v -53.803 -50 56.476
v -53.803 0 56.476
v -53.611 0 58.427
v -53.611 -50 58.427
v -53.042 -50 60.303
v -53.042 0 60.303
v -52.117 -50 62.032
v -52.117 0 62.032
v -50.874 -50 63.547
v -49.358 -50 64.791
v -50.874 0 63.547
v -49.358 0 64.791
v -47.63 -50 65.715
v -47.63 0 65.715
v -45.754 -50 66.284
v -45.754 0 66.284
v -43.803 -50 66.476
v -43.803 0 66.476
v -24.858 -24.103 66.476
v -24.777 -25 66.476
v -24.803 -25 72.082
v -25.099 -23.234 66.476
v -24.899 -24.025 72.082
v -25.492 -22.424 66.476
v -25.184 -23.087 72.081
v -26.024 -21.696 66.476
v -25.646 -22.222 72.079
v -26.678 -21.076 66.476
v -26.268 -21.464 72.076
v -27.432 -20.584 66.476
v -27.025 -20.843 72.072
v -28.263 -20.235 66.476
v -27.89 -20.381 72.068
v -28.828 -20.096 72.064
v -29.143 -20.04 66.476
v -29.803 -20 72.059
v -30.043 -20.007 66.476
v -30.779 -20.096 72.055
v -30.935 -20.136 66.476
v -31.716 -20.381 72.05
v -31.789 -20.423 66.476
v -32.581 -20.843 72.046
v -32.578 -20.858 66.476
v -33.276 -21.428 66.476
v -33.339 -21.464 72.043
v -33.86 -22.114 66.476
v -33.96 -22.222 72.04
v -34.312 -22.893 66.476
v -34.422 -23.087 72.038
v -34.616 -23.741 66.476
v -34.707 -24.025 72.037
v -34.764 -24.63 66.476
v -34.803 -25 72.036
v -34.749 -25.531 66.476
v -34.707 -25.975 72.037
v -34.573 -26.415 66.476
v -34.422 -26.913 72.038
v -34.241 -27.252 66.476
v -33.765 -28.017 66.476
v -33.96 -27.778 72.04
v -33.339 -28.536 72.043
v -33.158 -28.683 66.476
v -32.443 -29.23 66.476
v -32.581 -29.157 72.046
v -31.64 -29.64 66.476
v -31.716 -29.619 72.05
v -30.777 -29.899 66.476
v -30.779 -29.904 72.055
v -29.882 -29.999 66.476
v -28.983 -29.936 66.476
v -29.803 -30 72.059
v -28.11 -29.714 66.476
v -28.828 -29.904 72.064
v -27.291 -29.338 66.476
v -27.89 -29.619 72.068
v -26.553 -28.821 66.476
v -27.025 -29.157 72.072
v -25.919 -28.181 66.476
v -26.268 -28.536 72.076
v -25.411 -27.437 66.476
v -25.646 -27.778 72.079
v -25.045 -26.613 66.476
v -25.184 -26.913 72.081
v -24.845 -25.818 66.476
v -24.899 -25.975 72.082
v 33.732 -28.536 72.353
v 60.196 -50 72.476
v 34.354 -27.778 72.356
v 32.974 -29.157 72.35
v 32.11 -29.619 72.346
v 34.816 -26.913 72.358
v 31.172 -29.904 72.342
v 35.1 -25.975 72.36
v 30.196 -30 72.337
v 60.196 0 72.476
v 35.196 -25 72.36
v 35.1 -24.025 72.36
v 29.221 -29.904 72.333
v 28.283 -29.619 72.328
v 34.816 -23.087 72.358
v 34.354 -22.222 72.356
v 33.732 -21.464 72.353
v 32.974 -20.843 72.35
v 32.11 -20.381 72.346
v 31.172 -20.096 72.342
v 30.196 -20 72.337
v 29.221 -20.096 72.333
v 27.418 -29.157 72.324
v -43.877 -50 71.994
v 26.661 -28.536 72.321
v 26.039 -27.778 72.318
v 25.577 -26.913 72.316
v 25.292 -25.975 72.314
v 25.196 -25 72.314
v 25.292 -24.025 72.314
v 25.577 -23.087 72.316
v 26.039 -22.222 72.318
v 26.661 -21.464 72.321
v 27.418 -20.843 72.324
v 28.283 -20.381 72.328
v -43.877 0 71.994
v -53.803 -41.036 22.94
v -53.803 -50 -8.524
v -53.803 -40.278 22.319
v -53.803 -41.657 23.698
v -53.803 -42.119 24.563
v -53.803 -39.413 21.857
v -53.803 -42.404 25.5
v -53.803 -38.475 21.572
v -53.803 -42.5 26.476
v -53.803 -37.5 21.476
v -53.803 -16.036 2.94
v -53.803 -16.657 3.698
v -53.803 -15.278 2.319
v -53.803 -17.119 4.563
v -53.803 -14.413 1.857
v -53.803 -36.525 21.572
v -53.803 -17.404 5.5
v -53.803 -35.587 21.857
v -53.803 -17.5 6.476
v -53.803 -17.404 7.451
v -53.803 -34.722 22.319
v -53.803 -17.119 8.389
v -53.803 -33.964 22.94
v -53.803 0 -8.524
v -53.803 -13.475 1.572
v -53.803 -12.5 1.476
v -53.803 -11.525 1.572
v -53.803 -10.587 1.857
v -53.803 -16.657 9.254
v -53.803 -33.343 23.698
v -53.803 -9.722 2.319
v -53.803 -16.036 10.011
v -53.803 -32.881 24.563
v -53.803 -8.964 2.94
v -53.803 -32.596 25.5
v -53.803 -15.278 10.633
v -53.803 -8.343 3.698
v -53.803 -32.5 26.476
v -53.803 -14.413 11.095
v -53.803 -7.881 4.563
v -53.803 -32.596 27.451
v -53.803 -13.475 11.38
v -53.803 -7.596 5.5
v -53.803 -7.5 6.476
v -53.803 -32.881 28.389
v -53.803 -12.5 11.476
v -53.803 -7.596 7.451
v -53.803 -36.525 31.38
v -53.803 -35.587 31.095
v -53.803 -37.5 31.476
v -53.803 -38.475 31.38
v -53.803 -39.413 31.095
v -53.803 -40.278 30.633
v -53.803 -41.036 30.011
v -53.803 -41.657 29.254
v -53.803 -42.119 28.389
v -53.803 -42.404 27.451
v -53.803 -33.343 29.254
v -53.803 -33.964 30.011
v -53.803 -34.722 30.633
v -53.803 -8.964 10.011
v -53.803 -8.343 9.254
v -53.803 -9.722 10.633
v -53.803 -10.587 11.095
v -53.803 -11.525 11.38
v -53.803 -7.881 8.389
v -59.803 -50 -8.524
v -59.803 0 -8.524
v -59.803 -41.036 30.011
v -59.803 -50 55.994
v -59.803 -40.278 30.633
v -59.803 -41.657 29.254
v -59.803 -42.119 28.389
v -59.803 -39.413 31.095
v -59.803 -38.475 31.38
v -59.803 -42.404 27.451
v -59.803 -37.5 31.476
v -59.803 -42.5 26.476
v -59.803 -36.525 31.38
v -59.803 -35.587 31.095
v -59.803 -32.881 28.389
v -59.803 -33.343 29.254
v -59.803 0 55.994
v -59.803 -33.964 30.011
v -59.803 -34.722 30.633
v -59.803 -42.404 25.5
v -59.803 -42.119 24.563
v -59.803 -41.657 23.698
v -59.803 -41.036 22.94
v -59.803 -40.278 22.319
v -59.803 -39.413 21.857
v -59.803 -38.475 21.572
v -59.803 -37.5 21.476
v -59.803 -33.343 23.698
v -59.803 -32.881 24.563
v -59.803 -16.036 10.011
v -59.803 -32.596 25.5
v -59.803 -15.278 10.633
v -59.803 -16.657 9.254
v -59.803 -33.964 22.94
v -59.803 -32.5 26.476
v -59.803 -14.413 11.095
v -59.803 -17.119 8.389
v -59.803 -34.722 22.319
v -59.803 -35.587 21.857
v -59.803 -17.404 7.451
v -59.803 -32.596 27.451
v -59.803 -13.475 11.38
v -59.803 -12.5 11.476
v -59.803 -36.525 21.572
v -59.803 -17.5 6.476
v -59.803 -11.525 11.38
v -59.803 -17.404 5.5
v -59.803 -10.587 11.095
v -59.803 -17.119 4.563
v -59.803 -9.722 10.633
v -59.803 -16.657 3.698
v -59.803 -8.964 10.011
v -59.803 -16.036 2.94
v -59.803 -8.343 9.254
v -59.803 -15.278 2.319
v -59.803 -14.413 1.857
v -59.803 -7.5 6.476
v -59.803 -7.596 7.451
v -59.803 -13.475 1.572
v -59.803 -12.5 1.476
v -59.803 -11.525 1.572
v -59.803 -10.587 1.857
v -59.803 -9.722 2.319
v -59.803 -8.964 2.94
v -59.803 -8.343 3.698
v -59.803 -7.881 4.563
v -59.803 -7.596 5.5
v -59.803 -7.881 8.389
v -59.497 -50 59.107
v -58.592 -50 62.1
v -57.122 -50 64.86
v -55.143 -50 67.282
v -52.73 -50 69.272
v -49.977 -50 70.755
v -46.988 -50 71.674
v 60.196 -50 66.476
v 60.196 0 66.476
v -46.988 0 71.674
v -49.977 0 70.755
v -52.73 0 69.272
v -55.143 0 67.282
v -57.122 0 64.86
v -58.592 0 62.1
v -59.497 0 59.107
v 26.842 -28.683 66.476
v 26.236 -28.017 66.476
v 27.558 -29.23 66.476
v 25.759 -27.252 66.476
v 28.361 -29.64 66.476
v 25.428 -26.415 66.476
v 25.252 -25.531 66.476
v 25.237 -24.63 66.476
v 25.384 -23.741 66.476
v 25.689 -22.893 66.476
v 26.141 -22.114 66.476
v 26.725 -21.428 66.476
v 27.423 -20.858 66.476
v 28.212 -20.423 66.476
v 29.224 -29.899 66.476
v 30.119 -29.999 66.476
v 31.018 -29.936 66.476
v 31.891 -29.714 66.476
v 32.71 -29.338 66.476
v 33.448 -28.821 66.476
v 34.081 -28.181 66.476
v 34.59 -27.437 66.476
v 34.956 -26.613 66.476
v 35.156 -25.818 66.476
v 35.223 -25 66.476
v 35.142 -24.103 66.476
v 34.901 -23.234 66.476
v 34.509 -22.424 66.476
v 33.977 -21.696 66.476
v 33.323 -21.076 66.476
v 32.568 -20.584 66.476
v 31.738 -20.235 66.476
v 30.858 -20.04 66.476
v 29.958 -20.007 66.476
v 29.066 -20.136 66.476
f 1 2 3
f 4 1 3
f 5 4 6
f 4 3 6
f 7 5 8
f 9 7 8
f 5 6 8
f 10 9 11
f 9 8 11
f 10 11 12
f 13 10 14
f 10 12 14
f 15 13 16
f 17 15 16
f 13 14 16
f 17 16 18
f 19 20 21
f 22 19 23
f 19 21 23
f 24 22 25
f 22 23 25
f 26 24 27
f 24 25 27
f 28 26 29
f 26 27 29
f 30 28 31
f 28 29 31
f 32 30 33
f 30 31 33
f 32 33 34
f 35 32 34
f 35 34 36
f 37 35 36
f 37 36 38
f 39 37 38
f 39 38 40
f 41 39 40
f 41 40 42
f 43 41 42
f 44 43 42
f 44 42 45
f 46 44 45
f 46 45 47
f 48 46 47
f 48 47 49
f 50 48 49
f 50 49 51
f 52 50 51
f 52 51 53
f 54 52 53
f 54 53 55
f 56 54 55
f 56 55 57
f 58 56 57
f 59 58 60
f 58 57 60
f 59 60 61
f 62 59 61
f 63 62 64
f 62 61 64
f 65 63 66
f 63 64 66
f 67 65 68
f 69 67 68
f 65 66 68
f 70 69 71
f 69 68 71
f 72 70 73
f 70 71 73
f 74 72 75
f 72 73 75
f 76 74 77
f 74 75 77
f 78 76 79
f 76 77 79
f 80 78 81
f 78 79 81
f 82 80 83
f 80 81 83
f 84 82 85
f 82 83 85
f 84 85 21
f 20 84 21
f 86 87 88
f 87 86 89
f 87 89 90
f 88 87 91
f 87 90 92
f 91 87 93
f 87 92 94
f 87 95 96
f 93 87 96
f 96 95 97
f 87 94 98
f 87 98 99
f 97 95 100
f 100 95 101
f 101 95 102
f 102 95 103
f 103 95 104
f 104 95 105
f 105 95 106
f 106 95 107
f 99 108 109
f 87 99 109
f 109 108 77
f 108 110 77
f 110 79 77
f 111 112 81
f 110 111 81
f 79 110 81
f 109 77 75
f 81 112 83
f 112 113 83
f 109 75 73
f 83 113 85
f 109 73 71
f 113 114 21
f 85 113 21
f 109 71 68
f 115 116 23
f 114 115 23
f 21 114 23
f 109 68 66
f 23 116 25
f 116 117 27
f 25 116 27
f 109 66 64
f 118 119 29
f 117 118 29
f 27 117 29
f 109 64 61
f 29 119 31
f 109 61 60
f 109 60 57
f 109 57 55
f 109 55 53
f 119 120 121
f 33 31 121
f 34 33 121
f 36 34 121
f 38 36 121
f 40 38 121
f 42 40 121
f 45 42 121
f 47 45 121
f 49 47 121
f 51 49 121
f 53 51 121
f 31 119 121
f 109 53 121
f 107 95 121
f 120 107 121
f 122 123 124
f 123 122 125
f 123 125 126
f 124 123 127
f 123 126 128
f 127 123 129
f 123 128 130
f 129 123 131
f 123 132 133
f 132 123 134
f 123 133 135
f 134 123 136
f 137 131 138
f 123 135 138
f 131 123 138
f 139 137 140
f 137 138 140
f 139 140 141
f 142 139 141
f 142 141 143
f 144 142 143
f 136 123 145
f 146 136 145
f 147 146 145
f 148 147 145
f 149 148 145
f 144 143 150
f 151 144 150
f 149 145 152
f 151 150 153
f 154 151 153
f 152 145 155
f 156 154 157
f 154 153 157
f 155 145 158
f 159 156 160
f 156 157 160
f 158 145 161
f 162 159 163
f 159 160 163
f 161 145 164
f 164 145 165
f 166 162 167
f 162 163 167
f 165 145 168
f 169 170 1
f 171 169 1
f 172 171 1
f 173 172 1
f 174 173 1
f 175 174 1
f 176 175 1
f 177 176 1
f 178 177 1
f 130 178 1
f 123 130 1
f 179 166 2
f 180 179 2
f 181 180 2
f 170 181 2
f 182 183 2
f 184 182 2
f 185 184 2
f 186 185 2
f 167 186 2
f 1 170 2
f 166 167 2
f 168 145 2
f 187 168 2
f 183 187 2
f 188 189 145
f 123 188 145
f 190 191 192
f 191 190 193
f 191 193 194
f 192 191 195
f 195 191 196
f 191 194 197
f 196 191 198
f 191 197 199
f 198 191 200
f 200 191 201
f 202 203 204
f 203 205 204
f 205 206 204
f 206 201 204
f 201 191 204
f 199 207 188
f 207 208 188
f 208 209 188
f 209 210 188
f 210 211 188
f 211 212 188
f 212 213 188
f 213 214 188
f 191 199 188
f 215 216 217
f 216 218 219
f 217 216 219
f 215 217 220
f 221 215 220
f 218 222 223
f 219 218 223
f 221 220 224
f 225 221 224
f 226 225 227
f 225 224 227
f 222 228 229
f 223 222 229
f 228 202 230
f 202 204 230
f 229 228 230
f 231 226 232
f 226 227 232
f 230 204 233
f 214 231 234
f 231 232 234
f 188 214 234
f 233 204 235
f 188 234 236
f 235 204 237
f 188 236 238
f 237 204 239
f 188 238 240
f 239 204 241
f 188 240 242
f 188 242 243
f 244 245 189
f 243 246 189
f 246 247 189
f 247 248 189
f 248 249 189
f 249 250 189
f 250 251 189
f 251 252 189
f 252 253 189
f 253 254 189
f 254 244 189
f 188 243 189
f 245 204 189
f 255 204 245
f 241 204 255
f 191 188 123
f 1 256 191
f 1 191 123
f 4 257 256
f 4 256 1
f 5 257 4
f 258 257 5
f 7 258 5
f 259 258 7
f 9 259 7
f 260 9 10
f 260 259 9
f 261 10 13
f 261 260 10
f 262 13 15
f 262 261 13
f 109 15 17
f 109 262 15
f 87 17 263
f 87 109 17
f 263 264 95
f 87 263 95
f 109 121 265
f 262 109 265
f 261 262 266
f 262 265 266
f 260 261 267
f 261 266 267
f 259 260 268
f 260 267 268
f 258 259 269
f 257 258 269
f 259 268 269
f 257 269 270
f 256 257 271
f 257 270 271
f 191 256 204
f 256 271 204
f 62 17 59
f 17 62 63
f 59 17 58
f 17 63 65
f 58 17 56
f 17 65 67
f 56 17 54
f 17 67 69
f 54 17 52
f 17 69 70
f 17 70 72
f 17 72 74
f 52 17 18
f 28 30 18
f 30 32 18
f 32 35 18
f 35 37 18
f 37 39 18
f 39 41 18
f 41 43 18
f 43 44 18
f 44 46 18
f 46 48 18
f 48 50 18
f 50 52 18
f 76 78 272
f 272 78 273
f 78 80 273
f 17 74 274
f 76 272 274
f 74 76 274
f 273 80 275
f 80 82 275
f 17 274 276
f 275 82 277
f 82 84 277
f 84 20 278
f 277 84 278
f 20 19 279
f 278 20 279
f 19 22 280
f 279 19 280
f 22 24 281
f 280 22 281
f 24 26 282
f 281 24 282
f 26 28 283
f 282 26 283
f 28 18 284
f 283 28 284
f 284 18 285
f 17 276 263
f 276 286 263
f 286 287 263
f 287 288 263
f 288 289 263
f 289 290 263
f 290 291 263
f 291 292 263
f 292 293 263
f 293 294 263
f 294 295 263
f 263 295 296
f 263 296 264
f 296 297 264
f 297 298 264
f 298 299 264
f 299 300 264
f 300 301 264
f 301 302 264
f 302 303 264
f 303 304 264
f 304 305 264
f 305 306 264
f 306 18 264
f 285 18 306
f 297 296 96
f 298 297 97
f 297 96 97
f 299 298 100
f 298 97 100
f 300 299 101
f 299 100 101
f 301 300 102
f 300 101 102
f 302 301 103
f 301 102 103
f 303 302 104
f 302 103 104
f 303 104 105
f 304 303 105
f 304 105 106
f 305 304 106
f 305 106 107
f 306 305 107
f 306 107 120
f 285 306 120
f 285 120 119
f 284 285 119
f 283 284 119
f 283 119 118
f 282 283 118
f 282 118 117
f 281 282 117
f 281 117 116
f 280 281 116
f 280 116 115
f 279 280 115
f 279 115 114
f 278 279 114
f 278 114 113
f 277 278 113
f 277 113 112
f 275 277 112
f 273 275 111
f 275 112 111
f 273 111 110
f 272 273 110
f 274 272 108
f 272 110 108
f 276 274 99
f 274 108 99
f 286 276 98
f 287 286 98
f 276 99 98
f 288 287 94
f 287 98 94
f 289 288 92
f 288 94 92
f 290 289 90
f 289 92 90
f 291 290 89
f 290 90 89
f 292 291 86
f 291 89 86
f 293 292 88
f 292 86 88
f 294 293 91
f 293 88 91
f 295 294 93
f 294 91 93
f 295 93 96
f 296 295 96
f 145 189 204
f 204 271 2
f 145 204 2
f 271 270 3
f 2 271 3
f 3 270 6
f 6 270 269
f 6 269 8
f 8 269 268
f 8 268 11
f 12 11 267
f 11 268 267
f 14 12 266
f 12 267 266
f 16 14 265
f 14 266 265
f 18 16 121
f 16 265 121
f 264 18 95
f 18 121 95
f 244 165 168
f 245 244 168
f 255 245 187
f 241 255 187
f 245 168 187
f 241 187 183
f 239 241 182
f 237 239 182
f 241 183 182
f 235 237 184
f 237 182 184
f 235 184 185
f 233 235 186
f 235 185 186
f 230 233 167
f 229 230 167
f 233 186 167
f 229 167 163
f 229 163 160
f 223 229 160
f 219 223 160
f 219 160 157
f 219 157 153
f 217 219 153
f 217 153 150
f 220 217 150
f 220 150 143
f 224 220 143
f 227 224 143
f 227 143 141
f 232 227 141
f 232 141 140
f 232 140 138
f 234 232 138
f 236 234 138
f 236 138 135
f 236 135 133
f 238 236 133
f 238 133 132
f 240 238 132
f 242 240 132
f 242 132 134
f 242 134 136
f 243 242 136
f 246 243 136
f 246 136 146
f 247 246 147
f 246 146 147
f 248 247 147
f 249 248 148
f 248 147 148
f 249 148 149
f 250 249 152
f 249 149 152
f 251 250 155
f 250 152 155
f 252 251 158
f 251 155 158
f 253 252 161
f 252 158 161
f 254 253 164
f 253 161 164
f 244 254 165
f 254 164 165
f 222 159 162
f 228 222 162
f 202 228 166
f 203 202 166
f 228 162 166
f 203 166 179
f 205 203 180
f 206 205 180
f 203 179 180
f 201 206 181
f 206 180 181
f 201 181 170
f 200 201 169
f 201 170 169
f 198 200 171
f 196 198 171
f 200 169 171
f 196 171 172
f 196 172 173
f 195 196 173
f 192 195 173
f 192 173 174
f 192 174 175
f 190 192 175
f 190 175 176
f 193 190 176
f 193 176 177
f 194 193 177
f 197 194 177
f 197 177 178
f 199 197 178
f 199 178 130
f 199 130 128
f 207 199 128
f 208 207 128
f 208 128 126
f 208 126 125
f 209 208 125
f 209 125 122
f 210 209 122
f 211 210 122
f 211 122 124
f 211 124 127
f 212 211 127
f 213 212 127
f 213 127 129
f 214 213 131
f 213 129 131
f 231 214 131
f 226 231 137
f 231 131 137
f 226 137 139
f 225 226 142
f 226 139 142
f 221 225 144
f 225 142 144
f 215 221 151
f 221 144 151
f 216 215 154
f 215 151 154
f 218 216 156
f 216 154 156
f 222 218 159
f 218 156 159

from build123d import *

# Parameters (mm, degrees)
F1_DEPTH = 50
F2_R     = 5
F3_DEPTH = 25
F4_R     = 5
F5_DEPTH = 25


with BuildPart() as f1:
    # F0 (on Front) → F1 (new body)
    with BuildSketch(Plane.XZ):
        with BuildLine():
            ThreePointArc((-43.8768457623, 71.994107108), (-55.1426401019, 67.2817681029), (-59.8027732582, 55.9942785694))
            Line((-59.8027732582, 55.9942785694), (-59.8027732582, -8.5240794845))
            Line((-59.8027732582, -8.5240794845), (-53.8027732582, -8.5240794845))
            Line((-53.8027732582, -8.5240794845), (-53.8027732582, 56.4759205155))
            ThreePointArc((-53.8027732582, 56.4759205155), (-50.8738410701, 63.5469883274), (-43.8027732582, 66.4759205155))
            Line((-43.8027732582, 66.4759205155), (60.1959407812, 66.4759205155))
            Line((60.1959407812, 66.4759205155), (60.1959407812, 72.4759205155))
            Line((60.1959407812, 72.4759205155), (-43.8768457623, 71.994107108))
        make_face()
    extrude(amount=F1_DEPTH)

    # F2 (on face) → F3 (cut)
    with BuildSketch(Plane(origin=(-0.3342358086, 0, 72.1956911529), x_dir=(0.9999892837, 0, 0.0046295315), z_dir=(-0.0046295315, 0, 0.9999892837))):
        with Locations((-29.4691747415, -25)):
            Circle(F2_R)
        with Locations((30.5308252585, -25)):
            Circle(F2_R)
    extrude(amount=-F3_DEPTH, mode=Mode.SUBTRACT)

    # F4 (on face) → F5 (cut)
    with BuildSketch(Plane.YZ.offset(-53.8027732582)):
        with Locations((-12.5, 6.4759205155)):
            Circle(F4_R)
        with Locations((-37.5, 26.4759205155)):
            Circle(F4_R)
    extrude(amount=-F5_DEPTH, mode=Mode.SUBTRACT)


solid = f1.part
